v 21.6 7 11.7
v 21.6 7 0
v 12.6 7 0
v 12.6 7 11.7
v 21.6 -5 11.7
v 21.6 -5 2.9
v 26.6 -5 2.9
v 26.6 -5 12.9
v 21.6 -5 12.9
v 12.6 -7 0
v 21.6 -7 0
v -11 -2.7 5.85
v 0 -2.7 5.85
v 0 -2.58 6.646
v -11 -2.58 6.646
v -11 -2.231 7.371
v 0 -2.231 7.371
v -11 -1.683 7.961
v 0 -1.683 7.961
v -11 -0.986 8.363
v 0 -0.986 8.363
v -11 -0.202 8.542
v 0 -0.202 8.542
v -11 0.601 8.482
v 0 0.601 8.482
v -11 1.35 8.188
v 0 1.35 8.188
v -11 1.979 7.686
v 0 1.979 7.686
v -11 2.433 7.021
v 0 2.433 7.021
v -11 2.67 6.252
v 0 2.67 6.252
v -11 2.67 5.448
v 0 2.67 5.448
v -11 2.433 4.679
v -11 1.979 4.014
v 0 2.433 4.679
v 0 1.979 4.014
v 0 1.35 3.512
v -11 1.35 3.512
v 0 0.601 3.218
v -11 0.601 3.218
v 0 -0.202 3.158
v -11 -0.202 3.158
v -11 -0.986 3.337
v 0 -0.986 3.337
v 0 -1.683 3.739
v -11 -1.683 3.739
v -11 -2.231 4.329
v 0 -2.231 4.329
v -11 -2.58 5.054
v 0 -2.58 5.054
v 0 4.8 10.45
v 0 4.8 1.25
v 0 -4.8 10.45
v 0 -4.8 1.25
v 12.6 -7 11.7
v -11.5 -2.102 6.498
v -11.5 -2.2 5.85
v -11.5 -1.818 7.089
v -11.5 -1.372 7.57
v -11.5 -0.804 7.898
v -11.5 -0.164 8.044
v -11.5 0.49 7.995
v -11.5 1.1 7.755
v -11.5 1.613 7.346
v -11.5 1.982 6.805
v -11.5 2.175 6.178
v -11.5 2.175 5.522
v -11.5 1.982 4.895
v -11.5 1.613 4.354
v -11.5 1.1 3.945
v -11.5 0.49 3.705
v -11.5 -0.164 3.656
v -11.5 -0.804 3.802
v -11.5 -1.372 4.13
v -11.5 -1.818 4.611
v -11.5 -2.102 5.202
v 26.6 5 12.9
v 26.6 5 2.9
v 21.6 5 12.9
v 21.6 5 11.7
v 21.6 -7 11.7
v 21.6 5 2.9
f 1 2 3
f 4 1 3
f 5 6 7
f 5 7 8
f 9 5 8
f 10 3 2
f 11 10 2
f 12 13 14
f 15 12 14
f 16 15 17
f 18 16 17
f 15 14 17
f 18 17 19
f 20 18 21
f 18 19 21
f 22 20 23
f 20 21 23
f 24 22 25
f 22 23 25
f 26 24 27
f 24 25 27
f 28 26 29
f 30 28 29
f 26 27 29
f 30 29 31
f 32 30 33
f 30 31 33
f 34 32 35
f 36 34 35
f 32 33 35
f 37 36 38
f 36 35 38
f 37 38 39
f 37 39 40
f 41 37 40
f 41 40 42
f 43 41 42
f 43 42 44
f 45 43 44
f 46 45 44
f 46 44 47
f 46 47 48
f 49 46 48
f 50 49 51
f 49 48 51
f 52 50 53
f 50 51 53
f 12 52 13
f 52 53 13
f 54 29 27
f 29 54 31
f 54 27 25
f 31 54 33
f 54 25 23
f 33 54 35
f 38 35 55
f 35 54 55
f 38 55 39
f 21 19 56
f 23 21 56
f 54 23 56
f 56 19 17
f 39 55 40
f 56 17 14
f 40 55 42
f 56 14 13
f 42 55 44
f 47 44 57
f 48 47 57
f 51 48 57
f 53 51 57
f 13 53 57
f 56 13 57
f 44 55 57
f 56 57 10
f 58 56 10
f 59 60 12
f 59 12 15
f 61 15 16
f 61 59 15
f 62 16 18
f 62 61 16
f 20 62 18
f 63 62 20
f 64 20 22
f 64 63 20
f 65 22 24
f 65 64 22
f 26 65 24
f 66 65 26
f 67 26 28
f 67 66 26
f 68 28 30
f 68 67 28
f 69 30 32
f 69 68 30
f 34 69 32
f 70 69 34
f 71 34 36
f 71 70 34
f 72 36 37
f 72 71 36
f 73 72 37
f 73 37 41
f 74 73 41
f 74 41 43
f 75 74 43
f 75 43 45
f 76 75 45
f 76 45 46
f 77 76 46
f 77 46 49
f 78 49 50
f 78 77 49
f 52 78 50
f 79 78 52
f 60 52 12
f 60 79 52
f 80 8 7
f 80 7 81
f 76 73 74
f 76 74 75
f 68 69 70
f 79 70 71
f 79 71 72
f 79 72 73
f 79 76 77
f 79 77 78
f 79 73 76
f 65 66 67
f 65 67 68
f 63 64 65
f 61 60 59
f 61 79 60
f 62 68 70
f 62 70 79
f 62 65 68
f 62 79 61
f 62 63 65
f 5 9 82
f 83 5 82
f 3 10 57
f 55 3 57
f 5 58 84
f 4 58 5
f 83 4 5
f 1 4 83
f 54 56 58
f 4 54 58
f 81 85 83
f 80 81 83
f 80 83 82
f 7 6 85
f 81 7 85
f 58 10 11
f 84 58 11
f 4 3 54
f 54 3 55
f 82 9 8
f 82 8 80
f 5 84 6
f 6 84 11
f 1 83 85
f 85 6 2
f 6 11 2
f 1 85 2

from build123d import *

# Parameters (mm, degrees)
F1_DEPTH = 11.7
F3_DEPTH = 14
F4_R     = 2.7
F5_DEPTH = 11.5
F6_SIZE  = 0.5
F7_W     = 10
F7_H     = 10
F8_DEPTH = 5


with BuildPart() as f1:
    # F0 (on Top) → F1 (new body)
    with BuildSketch(Plane.XY):
        Polygon((0, 4.8), (0, 0), (0, -4.8), (12.6, -7), (21.6, -7), (21.6, 0), (21.6, 7), (12.6, 7), align=None)
    extrude(amount=F1_DEPTH)

    # F2 (on face) → F3 (cut, through all)
    with BuildSketch(Plane.XZ.offset(7)):
        Polygon((0, 10.45), (12.6, 11.7), (0, 11.7), align=None)
        Polygon((0, 0), (12.6, 0), (0, 1.25), align=None)
    extrude(amount=-F3_DEPTH, mode=Mode.SUBTRACT)

    # F4 (on face) → F5 (join)
    with BuildSketch(Plane(origin=(0, 0, 0), x_dir=(0, -1, 0), z_dir=(-1, 0, 0))):
        with Locations((0, 5.85)):
            Circle(F4_R)
    extrude(amount=F5_DEPTH)

    # F6
    f6_edges = [f1.edges().sort_by_distance(p)[0] for p in [
        (-11.5, 2.7, 5.85),
    ]]
    chamfer(f6_edges, length=F6_SIZE)

    # F7 (on face) → F8 (join)
    with BuildSketch(Plane.YZ.offset(21.6)):
        with Locations((0, 7.9)):
            Rectangle(F7_W, F7_H)
    extrude(amount=F8_DEPTH)


solid = f1.part
